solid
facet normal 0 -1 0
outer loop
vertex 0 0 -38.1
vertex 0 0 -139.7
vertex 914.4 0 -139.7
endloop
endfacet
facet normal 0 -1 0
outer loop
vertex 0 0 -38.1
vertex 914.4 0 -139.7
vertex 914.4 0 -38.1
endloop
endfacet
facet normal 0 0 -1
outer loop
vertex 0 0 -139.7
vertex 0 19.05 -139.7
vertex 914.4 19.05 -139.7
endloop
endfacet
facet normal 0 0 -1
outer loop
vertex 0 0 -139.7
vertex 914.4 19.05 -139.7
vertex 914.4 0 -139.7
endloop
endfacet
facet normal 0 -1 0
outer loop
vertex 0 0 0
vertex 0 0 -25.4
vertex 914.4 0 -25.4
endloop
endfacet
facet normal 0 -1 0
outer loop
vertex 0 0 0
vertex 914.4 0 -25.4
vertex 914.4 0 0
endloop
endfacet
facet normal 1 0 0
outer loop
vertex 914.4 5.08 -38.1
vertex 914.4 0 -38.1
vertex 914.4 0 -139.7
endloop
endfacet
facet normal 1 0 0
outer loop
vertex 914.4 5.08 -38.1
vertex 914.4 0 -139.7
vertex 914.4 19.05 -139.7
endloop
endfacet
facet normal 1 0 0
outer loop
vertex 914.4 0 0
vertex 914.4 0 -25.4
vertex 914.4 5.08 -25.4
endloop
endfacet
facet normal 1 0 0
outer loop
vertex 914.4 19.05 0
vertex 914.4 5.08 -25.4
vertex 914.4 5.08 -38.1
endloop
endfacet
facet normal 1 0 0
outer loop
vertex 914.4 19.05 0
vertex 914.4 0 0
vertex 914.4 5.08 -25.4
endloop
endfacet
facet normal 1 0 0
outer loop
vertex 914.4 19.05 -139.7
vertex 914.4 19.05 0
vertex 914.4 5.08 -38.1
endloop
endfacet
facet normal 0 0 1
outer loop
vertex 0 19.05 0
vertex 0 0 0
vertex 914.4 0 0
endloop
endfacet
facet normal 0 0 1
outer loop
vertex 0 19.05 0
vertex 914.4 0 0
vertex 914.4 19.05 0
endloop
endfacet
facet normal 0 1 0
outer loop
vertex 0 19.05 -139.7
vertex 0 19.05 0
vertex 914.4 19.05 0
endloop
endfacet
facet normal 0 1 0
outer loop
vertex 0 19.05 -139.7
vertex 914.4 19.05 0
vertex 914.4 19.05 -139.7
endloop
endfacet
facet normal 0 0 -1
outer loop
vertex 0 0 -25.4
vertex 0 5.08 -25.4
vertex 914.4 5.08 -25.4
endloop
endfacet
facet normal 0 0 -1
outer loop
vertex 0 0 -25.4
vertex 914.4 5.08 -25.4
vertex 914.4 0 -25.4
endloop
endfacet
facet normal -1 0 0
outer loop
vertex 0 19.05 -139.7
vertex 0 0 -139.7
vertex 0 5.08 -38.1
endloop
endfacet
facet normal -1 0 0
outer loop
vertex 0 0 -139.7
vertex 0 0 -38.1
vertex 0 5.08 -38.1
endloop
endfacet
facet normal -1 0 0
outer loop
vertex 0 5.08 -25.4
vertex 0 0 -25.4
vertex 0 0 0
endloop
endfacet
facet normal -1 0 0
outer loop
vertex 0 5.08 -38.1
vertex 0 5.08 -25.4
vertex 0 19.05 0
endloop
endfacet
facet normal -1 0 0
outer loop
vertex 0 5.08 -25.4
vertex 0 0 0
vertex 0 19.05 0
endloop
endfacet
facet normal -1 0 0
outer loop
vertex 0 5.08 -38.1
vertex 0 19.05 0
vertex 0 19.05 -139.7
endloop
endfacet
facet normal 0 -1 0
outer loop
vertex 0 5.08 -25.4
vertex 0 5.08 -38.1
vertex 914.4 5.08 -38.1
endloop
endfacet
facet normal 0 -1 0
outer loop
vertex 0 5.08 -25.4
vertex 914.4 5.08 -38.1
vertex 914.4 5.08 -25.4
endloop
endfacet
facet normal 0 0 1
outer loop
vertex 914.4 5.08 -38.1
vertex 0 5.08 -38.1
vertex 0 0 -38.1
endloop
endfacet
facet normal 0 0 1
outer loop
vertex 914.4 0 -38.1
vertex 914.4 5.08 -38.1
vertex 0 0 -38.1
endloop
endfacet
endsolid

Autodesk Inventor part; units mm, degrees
ref_plane "YZ Plane" through (0, 0, 0) normal (1, 0, 0) x (0, 1, 0)
ref_plane "XZ Plane" through (0, 0, 0) normal (0, 1, 0) x (-1, 0, 0)
ref_plane "XY Plane" through (0, 0, 0) normal (0, 0, 1) x (1, 0, 0)
sketch "Sketch1" plane through (0, 0, 0) normal (1, 0, 0) x (0, 1, 0)
  line L0 (0, 0) -> (19.05, 0)
  line L1 (19.05, 0) -> (19.05, -139.7)
  line L2 (19.05, -139.7) -> (0, -139.7)
  line L3 (0, -139.7) -> (0, 0)
  dimension "d0" = 19.05
  dimension "d1" = 139.7
extrude "Extrusion1" add sketch "Sketch1" along normal blind 914.4
sketch "Sketch2" plane through (0, 0, 0) normal (-1, 0, 0) x (0, 0, 1)
  line L0 (0, 19.05) -> (0, 0) projected
  line L1 (0, 9.525) -> (-25.4, 9.525)
  line L2 (-25.4, 9.525) -> (-38.1, 9.525)
  line L3 (0, 0) -> (-139.7, 0) projected
  line L4 (-139.7, 5.08) -> (-5.08, 5.08)
  line L5 (-5.08, 5.08) -> (-5.08, 19.05)
  line L6 (-38.1, 5.08) -> (-38.1, 0)
  line L7 (0, 0) -> (-139.7, 0) projected
  line L8 (-25.4, 5.08) -> (-25.4, 0)
  dimension "d4" = 25.4
  dimension "d5" = 12.7
  dimension "d6" = 5.08
extrude "Extrusion2" cut sketch "Sketch2" against normal through all contours L3 L6 L4 L8
properties part number "big bourd"
